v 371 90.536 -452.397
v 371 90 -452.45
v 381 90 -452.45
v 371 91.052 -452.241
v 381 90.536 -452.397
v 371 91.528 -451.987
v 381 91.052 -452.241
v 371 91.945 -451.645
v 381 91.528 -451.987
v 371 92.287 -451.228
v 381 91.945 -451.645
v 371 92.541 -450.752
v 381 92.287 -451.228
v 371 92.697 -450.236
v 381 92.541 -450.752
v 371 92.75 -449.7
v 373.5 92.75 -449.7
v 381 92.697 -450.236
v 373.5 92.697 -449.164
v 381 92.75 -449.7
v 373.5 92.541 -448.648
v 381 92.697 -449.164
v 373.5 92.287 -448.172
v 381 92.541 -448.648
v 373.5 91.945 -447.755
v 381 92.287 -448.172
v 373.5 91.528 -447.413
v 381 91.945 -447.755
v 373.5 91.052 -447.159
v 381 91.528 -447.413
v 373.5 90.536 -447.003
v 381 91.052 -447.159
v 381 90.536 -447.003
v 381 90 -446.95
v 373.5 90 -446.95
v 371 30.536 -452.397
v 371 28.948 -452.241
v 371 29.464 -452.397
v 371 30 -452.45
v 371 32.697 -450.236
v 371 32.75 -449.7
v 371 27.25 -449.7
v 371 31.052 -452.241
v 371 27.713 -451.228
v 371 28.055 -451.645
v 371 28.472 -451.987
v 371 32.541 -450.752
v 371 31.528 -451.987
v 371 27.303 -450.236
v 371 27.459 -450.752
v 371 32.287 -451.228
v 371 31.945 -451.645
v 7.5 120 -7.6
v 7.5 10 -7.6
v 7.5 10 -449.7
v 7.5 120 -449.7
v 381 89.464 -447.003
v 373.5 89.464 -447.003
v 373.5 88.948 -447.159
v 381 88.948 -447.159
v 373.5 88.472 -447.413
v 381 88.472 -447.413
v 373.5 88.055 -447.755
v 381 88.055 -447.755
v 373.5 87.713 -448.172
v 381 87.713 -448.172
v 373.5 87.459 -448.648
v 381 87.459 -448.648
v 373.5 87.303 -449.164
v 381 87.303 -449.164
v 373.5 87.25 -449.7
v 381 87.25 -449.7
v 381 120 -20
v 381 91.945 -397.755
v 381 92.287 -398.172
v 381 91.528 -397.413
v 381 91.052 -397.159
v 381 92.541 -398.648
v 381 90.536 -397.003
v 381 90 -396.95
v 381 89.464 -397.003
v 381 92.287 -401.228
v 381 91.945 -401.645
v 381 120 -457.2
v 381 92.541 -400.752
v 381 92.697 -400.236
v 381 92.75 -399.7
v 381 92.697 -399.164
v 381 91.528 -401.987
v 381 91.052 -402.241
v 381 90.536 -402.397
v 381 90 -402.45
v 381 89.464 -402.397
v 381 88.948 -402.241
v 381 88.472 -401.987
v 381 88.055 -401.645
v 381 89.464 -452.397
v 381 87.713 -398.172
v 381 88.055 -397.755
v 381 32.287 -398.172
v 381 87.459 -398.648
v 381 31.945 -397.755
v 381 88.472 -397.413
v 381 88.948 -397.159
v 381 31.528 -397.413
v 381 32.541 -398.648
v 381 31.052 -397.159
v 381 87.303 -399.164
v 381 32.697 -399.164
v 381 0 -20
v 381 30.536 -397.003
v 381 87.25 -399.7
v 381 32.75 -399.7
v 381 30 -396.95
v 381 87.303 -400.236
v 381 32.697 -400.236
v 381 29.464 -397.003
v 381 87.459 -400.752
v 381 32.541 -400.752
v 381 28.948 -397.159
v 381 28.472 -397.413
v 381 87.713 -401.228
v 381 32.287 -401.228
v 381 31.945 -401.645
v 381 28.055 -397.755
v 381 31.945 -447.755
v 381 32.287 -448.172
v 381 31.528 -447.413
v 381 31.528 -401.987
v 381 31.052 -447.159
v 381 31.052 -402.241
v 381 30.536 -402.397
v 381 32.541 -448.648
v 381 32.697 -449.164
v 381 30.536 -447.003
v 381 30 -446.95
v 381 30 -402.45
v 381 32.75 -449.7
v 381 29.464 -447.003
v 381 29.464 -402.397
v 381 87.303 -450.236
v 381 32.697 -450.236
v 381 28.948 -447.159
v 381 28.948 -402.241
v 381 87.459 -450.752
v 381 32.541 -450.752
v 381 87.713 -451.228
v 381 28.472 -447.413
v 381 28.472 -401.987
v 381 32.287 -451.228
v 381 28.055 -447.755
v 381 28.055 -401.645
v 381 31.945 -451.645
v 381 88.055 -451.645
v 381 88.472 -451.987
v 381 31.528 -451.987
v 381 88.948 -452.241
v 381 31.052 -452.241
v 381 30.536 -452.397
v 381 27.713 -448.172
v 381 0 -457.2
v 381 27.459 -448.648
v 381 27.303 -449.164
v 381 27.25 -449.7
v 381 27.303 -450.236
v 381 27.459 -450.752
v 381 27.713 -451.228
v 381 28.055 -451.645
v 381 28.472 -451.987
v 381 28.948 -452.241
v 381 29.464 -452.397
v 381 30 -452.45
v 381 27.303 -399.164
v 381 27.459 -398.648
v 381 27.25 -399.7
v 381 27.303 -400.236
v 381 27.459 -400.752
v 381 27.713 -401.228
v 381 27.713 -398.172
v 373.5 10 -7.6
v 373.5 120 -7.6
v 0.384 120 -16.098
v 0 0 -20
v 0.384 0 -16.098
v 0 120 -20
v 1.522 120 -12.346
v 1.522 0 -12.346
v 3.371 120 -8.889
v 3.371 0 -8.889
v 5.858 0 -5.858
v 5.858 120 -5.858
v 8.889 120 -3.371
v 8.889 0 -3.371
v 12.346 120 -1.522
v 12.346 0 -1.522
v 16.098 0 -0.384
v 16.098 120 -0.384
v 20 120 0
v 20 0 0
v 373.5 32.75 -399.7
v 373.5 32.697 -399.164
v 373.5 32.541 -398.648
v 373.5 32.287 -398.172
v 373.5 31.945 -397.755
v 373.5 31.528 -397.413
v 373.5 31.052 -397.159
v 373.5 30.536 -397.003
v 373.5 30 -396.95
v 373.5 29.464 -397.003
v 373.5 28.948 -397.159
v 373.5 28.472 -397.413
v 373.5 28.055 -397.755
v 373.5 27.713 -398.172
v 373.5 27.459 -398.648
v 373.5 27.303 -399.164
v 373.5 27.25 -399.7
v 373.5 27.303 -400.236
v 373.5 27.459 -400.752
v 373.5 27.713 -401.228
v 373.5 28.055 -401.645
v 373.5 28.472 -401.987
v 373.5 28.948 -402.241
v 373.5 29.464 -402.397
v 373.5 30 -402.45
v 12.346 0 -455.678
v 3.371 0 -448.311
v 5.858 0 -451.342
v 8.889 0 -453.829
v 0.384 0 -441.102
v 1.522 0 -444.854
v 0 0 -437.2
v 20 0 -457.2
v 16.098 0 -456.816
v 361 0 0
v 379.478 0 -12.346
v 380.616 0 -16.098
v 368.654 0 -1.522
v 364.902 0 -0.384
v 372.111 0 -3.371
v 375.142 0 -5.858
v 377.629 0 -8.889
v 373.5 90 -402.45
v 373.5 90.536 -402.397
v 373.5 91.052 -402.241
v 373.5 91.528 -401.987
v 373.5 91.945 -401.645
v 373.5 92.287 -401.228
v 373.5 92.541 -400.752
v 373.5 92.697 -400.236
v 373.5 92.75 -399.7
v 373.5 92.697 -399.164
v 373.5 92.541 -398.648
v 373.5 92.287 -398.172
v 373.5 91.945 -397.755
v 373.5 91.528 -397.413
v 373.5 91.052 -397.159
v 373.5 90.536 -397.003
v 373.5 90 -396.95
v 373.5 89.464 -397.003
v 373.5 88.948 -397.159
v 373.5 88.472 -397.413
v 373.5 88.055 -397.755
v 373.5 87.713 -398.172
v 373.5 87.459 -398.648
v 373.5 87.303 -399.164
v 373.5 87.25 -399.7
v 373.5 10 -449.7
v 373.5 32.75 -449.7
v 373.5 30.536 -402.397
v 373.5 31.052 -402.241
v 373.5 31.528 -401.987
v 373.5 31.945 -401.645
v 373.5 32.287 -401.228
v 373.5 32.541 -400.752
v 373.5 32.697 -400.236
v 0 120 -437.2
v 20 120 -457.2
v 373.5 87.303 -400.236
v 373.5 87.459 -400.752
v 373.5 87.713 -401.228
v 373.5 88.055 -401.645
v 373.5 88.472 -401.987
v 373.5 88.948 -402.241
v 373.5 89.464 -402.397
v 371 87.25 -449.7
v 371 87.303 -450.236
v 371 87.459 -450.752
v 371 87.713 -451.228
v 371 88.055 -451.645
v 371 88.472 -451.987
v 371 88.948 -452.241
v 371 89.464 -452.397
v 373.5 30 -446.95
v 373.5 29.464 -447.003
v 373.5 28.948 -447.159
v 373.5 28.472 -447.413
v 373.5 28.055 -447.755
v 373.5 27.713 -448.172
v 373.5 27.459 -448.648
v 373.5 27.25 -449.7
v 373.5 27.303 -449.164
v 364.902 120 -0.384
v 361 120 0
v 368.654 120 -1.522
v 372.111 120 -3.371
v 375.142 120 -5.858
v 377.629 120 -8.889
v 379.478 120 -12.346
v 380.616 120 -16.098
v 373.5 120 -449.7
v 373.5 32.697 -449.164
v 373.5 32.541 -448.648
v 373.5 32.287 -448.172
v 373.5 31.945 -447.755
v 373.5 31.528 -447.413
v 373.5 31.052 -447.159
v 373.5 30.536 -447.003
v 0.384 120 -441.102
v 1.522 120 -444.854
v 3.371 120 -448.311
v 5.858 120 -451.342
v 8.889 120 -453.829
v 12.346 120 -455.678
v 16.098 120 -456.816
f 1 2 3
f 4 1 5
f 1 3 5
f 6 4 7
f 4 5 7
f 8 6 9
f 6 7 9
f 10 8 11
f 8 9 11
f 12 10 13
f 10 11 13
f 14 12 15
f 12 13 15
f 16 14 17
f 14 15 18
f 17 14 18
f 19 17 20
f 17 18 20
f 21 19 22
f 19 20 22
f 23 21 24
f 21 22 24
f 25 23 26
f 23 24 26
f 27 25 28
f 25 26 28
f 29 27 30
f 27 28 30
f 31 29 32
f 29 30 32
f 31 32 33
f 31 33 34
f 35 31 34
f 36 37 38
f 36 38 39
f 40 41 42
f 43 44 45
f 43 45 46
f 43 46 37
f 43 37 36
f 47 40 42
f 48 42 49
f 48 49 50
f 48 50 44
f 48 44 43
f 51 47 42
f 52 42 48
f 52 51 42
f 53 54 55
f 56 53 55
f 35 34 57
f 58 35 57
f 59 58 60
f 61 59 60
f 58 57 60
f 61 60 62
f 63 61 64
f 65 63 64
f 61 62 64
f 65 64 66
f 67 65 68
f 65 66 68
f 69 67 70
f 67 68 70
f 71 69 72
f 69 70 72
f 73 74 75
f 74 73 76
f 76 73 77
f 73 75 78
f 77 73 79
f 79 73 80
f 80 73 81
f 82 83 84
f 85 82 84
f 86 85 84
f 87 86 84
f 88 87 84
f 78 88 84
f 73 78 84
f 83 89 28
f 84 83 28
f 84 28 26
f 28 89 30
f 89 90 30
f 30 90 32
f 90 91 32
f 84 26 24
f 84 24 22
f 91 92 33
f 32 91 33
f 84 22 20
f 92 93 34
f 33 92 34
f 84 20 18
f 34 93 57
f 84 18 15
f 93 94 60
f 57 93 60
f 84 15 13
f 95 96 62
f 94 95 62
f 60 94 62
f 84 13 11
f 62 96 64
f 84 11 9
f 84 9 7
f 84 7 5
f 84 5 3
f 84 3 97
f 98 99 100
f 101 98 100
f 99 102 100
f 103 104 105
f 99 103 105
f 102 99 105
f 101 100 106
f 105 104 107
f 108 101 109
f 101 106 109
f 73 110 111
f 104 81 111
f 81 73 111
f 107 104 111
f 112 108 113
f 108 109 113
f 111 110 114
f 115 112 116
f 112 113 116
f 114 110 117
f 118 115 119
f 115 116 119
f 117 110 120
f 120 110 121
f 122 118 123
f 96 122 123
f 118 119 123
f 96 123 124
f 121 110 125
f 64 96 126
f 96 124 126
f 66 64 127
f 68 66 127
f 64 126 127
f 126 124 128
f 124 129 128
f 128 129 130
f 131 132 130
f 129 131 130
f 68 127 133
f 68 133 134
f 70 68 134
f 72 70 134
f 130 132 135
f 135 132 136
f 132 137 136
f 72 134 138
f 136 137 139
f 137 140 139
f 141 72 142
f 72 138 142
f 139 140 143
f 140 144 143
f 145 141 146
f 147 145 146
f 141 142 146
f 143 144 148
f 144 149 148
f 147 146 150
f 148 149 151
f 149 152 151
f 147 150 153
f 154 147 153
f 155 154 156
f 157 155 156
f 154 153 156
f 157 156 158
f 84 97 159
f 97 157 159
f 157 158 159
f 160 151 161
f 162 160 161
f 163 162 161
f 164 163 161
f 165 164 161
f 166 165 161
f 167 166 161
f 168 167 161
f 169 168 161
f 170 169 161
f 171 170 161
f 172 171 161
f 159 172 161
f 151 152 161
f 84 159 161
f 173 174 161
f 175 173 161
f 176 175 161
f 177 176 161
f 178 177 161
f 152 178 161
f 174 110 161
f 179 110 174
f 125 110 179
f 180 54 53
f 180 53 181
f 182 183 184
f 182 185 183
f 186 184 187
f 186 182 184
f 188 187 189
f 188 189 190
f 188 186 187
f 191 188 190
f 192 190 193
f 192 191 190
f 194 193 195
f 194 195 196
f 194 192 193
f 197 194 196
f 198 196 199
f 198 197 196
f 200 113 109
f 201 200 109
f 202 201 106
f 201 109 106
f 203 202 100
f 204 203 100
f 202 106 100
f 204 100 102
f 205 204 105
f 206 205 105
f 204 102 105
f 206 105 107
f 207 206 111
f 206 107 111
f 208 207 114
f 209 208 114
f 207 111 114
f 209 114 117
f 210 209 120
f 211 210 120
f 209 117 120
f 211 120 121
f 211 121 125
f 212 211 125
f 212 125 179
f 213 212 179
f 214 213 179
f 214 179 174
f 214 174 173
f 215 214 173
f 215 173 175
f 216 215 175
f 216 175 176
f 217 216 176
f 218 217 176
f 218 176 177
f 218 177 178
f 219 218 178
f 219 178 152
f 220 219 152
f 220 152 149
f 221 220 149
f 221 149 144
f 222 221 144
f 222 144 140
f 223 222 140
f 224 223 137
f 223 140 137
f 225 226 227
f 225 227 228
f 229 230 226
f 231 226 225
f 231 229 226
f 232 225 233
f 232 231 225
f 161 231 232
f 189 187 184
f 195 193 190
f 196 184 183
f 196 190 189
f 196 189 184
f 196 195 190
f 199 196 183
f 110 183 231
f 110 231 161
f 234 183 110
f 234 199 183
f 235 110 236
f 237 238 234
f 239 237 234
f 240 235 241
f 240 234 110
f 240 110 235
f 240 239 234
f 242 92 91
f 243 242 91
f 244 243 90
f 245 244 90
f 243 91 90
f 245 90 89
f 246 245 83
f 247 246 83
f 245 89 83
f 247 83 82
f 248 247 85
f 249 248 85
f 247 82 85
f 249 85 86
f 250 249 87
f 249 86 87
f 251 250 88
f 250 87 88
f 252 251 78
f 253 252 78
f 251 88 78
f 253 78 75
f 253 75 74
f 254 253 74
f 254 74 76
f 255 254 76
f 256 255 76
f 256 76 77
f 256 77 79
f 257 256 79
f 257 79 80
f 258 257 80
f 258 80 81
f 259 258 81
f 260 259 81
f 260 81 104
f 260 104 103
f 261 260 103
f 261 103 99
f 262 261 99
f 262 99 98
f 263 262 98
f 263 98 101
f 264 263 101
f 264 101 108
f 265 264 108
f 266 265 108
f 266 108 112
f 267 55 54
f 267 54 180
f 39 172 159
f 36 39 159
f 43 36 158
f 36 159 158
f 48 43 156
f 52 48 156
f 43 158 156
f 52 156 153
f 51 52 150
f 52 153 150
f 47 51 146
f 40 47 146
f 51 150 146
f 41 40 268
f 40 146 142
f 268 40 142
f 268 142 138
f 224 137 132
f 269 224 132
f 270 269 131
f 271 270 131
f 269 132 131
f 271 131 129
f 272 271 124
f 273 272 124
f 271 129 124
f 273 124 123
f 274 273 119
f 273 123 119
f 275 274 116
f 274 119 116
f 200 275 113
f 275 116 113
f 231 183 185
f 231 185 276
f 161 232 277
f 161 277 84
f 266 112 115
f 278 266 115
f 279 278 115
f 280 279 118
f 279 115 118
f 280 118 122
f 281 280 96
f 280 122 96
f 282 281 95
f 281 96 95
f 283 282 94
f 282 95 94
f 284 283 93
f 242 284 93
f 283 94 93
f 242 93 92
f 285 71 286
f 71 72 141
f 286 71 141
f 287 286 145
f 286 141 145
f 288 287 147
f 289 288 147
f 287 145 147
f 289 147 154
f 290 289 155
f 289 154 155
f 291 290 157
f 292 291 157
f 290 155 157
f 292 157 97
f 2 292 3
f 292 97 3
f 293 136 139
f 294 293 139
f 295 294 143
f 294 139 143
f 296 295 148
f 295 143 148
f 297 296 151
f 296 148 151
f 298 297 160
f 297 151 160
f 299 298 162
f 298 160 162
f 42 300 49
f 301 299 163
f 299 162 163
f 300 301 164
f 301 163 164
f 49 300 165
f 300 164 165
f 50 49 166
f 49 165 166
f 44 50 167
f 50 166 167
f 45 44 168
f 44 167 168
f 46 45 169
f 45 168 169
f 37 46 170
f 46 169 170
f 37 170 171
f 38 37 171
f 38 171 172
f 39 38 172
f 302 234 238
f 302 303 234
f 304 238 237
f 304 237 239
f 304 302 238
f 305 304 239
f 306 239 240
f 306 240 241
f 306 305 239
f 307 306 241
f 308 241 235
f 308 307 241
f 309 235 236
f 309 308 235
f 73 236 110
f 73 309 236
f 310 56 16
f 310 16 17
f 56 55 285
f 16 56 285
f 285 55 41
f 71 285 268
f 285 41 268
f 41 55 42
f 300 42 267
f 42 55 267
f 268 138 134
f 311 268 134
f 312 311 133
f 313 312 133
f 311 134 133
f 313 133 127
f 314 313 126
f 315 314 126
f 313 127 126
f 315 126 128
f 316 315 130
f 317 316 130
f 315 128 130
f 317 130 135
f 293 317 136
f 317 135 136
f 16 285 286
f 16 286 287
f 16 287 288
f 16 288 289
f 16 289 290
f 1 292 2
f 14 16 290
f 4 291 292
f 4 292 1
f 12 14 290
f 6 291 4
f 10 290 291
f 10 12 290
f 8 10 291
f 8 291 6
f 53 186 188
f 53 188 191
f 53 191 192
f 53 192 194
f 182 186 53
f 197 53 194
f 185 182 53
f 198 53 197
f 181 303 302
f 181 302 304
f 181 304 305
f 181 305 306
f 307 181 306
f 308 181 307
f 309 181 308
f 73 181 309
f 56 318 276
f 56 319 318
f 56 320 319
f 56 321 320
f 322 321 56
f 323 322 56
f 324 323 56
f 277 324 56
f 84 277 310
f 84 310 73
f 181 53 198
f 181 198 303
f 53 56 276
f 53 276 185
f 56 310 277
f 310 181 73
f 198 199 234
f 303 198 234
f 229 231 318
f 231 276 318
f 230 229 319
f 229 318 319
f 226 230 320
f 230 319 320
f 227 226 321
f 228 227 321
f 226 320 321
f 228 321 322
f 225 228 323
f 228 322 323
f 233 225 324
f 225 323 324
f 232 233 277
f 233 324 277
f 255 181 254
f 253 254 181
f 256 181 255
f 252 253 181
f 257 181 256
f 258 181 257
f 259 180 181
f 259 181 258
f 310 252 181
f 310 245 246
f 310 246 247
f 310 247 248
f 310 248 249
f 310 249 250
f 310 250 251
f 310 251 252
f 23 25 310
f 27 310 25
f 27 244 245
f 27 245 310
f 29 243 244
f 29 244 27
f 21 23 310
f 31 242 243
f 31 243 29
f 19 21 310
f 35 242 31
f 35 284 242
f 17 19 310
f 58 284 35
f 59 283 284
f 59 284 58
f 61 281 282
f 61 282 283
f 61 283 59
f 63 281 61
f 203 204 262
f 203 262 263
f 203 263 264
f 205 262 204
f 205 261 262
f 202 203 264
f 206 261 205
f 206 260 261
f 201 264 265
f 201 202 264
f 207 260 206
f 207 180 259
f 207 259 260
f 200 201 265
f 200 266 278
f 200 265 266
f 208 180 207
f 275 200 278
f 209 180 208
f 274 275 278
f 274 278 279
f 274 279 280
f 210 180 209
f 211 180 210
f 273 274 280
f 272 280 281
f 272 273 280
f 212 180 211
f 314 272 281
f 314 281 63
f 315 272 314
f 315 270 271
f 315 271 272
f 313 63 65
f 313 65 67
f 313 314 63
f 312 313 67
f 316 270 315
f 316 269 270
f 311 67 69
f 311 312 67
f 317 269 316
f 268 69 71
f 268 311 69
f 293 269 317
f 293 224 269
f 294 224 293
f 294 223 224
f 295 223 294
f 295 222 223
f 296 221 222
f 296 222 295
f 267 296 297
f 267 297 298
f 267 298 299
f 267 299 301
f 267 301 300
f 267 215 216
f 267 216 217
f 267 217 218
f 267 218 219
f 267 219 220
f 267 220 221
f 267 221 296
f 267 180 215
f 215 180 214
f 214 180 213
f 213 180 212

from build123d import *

# Parameters (mm, degrees)
SKETCH1_W           = 381
SKETCH1_H           = 457.2
SKETCH1_W_2         = 366
SKETCH1_H_2         = 442.1
BOSS_EXTRUDE1_DEPTH = 120
SKETCH2_W           = 366
SKETCH2_H           = 442.1
BOSS_EXTRUDE2_DEPTH = 10
FILLET1_R           = 20
CUT_EXTRUDE1_DEPTH  = 10


with BuildPart() as part:
    # Sketch1 → Boss-Extrude1 (new body)
    with BuildSketch(Plane(origin=(0, 0, 0), x_dir=(1, 0, 0), z_dir=(0, 1, 0))):
        with Locations((190.5, 228.6)):
            Rectangle(SKETCH1_W, SKETCH1_H)
        with Locations((190.5, 228.65)):
            Rectangle(SKETCH1_W_2, SKETCH1_H_2, mode=Mode.SUBTRACT)
    extrude(amount=BOSS_EXTRUDE1_DEPTH)

    # Sketch2 → Boss-Extrude2 (add)
    with BuildSketch(Plane.XZ):
        with Locations((190.5, -228.65)):
            Rectangle(SKETCH2_W, SKETCH2_H)
    extrude(amount=-BOSS_EXTRUDE2_DEPTH)

    # Fillet1
    fillet1_edges = [part.edges().sort_by_distance(p)[0] for p in [
        (0, 60, -457.2),
        (381, 60, 0),
        (0, 60, 0),
    ]]
    fillet(fillet1_edges, radius=FILLET1_R)

    # Sketch3 → Cut-Extrude1 (cut)
    with BuildSketch(Plane(origin=(381, 0, 0), x_dir=(0, 0, -1), z_dir=(1, 0, 0))):
        with BuildLine():
            Line((399.7, 87.25), (399.7, 90))
            Line((399.7, 90), (402.45, 90))
            ThreePointArc((402.45, 90), (397.755456352, 91.944543648), (399.7, 87.25))
        make_face()
        with BuildLine():
            Line((402.45, 90), (399.7, 90))
            Line((399.7, 90), (399.7, 87.25))
            ThreePointArc((399.7, 87.25), (401.644543648, 88.055456352), (402.45, 90))
        make_face()
        with BuildLine():
            ThreePointArc((452.45, 90), (449.7, 92.75), (446.95, 90))
            Line((446.95, 90), (449.7, 90))
            Line((449.7, 90), (449.7, 87.25))
            ThreePointArc((449.7, 87.25), (451.644543648, 88.055456352), (452.45, 90))
        make_face()
        with BuildLine():
            Line((449.7, 90), (446.95, 90))
            ThreePointArc((446.95, 90), (447.755456352, 88.055456352), (449.7, 87.25))
            Line((449.7, 87.25), (449.7, 90))
        make_face()
        with BuildLine():
            ThreePointArc((452.45, 30), (451.644543648, 31.944543648), (449.7, 32.75))
            Line((449.7, 32.75), (449.7, 30))
            Line((449.7, 30), (446.95, 30))
            ThreePointArc((446.95, 30), (449.7, 27.25), (452.45, 30))
        make_face()
        with BuildLine():
            Line((449.7, 30), (449.7, 32.75))
            ThreePointArc((449.7, 32.75), (447.755456352, 31.944543648), (446.95, 30))
            Line((446.95, 30), (449.7, 30))
        make_face()
        with BuildLine():
            ThreePointArc((402.45, 30), (401.644543648, 31.944543648), (399.7, 32.75))
            Line((399.7, 32.75), (399.7, 30))
            Line((399.7, 30), (402.45, 30))
        make_face()
        with BuildLine():
            Line((399.7, 30), (399.7, 32.75))
            ThreePointArc((399.7, 32.75), (397.755456352, 28.055456352), (402.45, 30))
            Line((402.45, 30), (399.7, 30))
        make_face()
    extrude(amount=-CUT_EXTRUDE1_DEPTH, mode=Mode.SUBTRACT)


solid = part.part
